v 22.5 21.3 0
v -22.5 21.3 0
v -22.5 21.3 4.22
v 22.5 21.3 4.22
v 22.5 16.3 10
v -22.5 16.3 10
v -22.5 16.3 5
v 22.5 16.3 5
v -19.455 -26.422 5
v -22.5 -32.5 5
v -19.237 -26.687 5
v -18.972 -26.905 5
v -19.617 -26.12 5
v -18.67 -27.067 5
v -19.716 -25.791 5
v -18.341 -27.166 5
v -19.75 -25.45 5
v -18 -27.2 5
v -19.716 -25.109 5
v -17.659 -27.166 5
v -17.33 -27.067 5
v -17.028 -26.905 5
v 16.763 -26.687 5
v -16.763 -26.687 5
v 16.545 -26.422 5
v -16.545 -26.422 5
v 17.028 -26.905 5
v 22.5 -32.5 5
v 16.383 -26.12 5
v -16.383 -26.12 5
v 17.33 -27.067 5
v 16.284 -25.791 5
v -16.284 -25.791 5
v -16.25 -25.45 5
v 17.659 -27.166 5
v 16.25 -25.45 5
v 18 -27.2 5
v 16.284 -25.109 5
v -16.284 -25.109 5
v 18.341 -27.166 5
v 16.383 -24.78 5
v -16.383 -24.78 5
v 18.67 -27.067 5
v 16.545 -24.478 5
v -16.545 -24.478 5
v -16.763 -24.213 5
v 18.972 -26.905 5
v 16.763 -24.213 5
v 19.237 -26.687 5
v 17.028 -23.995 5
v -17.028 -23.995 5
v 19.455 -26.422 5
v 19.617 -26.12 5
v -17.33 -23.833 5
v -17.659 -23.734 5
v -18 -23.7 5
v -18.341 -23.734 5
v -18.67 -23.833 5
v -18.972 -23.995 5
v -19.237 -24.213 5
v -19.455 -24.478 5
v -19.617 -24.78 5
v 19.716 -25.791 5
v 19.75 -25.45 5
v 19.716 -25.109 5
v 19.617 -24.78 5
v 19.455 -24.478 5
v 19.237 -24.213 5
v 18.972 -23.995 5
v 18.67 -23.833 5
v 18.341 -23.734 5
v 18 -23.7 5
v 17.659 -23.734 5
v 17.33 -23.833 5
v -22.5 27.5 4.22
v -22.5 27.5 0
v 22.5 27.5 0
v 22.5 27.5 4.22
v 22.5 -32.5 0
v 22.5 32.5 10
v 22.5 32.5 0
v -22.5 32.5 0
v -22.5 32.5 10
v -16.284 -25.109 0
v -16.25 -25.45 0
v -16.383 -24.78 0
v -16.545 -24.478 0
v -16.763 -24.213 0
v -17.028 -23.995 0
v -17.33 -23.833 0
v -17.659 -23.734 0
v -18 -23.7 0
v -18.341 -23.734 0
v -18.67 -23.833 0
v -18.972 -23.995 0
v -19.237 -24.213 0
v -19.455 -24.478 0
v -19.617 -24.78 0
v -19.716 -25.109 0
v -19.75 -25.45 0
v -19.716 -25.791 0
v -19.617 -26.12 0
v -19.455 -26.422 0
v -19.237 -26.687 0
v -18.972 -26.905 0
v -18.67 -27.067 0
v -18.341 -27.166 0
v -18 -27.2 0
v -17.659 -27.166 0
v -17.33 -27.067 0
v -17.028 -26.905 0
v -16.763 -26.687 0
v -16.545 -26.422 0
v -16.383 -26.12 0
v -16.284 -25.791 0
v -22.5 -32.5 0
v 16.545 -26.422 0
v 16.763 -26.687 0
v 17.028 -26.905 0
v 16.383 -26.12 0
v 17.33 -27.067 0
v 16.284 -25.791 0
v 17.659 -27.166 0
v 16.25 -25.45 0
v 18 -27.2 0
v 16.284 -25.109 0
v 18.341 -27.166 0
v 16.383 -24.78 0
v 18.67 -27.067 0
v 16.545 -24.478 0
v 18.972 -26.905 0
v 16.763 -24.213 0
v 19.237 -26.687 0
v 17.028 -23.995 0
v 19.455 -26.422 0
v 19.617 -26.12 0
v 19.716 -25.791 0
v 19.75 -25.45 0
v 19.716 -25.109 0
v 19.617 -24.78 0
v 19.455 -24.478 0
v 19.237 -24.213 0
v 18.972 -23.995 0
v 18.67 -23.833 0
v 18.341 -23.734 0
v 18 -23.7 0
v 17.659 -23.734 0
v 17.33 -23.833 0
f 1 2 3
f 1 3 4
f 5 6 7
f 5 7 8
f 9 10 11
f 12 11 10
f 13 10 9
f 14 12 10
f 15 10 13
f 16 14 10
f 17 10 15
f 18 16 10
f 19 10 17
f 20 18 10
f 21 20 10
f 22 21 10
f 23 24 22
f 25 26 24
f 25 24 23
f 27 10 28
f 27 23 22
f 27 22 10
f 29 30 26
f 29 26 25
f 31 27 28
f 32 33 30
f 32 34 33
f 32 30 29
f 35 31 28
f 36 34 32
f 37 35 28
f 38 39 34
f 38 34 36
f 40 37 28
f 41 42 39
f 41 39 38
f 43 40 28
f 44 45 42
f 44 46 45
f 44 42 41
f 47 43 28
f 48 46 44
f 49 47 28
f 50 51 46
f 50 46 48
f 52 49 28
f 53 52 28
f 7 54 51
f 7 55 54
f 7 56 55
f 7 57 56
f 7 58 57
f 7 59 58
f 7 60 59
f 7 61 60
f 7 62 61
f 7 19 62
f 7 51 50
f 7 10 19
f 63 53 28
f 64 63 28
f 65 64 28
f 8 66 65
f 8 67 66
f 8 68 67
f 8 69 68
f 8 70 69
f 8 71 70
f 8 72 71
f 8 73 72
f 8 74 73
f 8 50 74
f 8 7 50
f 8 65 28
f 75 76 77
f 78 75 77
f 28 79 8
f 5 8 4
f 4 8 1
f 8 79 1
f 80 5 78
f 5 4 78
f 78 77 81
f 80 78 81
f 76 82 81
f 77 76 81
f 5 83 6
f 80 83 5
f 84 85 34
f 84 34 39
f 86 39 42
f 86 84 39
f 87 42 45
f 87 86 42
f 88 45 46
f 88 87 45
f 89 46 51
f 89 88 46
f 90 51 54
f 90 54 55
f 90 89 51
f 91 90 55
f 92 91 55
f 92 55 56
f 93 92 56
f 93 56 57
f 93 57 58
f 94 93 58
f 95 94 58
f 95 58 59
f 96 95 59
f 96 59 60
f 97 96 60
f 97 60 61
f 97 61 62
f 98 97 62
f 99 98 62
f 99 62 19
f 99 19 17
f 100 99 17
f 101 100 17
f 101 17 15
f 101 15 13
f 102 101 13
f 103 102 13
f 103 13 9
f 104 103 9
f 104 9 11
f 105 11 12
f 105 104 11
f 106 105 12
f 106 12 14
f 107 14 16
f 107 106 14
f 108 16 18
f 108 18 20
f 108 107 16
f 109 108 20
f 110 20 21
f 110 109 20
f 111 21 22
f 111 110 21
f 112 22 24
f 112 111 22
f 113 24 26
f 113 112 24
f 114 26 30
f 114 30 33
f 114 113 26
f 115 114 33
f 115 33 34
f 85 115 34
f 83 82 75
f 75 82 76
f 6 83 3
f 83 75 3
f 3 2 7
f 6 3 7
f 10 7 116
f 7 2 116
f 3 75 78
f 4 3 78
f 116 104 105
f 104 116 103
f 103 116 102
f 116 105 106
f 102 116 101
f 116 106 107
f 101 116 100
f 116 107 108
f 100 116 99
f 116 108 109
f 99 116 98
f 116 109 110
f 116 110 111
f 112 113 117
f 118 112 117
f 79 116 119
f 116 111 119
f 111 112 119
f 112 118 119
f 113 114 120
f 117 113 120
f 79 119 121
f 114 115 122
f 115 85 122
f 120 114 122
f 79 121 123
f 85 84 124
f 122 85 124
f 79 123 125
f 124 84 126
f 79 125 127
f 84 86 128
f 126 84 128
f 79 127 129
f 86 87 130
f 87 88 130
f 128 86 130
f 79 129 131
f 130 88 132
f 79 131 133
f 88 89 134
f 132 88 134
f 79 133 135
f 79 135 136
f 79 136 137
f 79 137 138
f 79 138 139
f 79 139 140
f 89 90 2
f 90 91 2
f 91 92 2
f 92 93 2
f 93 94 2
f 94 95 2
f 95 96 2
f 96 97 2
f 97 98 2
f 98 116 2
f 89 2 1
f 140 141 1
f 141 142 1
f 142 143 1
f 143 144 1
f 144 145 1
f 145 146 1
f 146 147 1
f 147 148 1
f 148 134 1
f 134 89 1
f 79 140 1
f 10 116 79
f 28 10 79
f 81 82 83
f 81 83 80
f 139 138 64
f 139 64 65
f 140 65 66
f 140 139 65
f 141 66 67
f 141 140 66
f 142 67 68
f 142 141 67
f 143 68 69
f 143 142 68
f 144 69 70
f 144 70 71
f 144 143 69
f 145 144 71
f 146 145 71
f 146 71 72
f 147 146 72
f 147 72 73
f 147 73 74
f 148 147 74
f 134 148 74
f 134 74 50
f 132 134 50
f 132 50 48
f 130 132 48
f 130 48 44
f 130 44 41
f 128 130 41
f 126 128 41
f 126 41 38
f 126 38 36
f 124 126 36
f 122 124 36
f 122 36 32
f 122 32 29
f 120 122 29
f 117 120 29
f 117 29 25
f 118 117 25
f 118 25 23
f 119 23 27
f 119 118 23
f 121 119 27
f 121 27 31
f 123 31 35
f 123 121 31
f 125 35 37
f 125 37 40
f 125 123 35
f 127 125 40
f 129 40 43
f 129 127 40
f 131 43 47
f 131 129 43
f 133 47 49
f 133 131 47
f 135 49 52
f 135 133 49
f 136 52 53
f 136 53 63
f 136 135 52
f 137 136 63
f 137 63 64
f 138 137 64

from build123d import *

# Parameters (mm, degrees)
F1_W     = 45
F1_H     = 5
F1_H_2   = 6.2
F1_H_3   = 53.8
F1_R     = 1.75
F2_DEPTH = 10
F3_DEPTH = 4.22
F4_W     = 45
F4_H     = 48.8
F4_R     = 1.75
F5_DEPTH = 5


# Not quite as in the source:
# - a feature of the source that left no trace in its solid (it failed there, or was rolled back) is left out


with BuildPart() as f2:
    # F1 (on Top) → F2 (new body)
    with BuildSketch(Plane.XY):
        with Locations((0, 30)):
            Rectangle(F1_W, F1_H)
        with Locations((0, 24.4)):
            Rectangle(F1_W, F1_H_2)
        with Locations((0, -5.6)):
            Rectangle(F1_W, F1_H_3)
        with Locations((-18, -25.45)):
            Circle(F1_R, mode=Mode.SUBTRACT)
        with Locations((18, -25.45)):
            Circle(F1_R, mode=Mode.SUBTRACT)
    extrude(amount=F2_DEPTH)

    # F1 (on Top) → F3 (cut)
    with BuildSketch(Plane.XY):
        with Locations((0, 24.4)):
            Rectangle(F1_W, F1_H_2)
    extrude(amount=F3_DEPTH, mode=Mode.SUBTRACT)

    # F4 (on face) → F5 (cut)
    with BuildSketch(Plane.XY.offset(10)):
        with Locations((0, -8.1)):
            Rectangle(F4_W, F4_H)
        with Locations((-18, -25.45)):
            Circle(F4_R, mode=Mode.SUBTRACT)
        with Locations((18, -25.45)):
            Circle(F4_R, mode=Mode.SUBTRACT)
    extrude(amount=-F5_DEPTH, mode=Mode.SUBTRACT)


solid = f2.part
